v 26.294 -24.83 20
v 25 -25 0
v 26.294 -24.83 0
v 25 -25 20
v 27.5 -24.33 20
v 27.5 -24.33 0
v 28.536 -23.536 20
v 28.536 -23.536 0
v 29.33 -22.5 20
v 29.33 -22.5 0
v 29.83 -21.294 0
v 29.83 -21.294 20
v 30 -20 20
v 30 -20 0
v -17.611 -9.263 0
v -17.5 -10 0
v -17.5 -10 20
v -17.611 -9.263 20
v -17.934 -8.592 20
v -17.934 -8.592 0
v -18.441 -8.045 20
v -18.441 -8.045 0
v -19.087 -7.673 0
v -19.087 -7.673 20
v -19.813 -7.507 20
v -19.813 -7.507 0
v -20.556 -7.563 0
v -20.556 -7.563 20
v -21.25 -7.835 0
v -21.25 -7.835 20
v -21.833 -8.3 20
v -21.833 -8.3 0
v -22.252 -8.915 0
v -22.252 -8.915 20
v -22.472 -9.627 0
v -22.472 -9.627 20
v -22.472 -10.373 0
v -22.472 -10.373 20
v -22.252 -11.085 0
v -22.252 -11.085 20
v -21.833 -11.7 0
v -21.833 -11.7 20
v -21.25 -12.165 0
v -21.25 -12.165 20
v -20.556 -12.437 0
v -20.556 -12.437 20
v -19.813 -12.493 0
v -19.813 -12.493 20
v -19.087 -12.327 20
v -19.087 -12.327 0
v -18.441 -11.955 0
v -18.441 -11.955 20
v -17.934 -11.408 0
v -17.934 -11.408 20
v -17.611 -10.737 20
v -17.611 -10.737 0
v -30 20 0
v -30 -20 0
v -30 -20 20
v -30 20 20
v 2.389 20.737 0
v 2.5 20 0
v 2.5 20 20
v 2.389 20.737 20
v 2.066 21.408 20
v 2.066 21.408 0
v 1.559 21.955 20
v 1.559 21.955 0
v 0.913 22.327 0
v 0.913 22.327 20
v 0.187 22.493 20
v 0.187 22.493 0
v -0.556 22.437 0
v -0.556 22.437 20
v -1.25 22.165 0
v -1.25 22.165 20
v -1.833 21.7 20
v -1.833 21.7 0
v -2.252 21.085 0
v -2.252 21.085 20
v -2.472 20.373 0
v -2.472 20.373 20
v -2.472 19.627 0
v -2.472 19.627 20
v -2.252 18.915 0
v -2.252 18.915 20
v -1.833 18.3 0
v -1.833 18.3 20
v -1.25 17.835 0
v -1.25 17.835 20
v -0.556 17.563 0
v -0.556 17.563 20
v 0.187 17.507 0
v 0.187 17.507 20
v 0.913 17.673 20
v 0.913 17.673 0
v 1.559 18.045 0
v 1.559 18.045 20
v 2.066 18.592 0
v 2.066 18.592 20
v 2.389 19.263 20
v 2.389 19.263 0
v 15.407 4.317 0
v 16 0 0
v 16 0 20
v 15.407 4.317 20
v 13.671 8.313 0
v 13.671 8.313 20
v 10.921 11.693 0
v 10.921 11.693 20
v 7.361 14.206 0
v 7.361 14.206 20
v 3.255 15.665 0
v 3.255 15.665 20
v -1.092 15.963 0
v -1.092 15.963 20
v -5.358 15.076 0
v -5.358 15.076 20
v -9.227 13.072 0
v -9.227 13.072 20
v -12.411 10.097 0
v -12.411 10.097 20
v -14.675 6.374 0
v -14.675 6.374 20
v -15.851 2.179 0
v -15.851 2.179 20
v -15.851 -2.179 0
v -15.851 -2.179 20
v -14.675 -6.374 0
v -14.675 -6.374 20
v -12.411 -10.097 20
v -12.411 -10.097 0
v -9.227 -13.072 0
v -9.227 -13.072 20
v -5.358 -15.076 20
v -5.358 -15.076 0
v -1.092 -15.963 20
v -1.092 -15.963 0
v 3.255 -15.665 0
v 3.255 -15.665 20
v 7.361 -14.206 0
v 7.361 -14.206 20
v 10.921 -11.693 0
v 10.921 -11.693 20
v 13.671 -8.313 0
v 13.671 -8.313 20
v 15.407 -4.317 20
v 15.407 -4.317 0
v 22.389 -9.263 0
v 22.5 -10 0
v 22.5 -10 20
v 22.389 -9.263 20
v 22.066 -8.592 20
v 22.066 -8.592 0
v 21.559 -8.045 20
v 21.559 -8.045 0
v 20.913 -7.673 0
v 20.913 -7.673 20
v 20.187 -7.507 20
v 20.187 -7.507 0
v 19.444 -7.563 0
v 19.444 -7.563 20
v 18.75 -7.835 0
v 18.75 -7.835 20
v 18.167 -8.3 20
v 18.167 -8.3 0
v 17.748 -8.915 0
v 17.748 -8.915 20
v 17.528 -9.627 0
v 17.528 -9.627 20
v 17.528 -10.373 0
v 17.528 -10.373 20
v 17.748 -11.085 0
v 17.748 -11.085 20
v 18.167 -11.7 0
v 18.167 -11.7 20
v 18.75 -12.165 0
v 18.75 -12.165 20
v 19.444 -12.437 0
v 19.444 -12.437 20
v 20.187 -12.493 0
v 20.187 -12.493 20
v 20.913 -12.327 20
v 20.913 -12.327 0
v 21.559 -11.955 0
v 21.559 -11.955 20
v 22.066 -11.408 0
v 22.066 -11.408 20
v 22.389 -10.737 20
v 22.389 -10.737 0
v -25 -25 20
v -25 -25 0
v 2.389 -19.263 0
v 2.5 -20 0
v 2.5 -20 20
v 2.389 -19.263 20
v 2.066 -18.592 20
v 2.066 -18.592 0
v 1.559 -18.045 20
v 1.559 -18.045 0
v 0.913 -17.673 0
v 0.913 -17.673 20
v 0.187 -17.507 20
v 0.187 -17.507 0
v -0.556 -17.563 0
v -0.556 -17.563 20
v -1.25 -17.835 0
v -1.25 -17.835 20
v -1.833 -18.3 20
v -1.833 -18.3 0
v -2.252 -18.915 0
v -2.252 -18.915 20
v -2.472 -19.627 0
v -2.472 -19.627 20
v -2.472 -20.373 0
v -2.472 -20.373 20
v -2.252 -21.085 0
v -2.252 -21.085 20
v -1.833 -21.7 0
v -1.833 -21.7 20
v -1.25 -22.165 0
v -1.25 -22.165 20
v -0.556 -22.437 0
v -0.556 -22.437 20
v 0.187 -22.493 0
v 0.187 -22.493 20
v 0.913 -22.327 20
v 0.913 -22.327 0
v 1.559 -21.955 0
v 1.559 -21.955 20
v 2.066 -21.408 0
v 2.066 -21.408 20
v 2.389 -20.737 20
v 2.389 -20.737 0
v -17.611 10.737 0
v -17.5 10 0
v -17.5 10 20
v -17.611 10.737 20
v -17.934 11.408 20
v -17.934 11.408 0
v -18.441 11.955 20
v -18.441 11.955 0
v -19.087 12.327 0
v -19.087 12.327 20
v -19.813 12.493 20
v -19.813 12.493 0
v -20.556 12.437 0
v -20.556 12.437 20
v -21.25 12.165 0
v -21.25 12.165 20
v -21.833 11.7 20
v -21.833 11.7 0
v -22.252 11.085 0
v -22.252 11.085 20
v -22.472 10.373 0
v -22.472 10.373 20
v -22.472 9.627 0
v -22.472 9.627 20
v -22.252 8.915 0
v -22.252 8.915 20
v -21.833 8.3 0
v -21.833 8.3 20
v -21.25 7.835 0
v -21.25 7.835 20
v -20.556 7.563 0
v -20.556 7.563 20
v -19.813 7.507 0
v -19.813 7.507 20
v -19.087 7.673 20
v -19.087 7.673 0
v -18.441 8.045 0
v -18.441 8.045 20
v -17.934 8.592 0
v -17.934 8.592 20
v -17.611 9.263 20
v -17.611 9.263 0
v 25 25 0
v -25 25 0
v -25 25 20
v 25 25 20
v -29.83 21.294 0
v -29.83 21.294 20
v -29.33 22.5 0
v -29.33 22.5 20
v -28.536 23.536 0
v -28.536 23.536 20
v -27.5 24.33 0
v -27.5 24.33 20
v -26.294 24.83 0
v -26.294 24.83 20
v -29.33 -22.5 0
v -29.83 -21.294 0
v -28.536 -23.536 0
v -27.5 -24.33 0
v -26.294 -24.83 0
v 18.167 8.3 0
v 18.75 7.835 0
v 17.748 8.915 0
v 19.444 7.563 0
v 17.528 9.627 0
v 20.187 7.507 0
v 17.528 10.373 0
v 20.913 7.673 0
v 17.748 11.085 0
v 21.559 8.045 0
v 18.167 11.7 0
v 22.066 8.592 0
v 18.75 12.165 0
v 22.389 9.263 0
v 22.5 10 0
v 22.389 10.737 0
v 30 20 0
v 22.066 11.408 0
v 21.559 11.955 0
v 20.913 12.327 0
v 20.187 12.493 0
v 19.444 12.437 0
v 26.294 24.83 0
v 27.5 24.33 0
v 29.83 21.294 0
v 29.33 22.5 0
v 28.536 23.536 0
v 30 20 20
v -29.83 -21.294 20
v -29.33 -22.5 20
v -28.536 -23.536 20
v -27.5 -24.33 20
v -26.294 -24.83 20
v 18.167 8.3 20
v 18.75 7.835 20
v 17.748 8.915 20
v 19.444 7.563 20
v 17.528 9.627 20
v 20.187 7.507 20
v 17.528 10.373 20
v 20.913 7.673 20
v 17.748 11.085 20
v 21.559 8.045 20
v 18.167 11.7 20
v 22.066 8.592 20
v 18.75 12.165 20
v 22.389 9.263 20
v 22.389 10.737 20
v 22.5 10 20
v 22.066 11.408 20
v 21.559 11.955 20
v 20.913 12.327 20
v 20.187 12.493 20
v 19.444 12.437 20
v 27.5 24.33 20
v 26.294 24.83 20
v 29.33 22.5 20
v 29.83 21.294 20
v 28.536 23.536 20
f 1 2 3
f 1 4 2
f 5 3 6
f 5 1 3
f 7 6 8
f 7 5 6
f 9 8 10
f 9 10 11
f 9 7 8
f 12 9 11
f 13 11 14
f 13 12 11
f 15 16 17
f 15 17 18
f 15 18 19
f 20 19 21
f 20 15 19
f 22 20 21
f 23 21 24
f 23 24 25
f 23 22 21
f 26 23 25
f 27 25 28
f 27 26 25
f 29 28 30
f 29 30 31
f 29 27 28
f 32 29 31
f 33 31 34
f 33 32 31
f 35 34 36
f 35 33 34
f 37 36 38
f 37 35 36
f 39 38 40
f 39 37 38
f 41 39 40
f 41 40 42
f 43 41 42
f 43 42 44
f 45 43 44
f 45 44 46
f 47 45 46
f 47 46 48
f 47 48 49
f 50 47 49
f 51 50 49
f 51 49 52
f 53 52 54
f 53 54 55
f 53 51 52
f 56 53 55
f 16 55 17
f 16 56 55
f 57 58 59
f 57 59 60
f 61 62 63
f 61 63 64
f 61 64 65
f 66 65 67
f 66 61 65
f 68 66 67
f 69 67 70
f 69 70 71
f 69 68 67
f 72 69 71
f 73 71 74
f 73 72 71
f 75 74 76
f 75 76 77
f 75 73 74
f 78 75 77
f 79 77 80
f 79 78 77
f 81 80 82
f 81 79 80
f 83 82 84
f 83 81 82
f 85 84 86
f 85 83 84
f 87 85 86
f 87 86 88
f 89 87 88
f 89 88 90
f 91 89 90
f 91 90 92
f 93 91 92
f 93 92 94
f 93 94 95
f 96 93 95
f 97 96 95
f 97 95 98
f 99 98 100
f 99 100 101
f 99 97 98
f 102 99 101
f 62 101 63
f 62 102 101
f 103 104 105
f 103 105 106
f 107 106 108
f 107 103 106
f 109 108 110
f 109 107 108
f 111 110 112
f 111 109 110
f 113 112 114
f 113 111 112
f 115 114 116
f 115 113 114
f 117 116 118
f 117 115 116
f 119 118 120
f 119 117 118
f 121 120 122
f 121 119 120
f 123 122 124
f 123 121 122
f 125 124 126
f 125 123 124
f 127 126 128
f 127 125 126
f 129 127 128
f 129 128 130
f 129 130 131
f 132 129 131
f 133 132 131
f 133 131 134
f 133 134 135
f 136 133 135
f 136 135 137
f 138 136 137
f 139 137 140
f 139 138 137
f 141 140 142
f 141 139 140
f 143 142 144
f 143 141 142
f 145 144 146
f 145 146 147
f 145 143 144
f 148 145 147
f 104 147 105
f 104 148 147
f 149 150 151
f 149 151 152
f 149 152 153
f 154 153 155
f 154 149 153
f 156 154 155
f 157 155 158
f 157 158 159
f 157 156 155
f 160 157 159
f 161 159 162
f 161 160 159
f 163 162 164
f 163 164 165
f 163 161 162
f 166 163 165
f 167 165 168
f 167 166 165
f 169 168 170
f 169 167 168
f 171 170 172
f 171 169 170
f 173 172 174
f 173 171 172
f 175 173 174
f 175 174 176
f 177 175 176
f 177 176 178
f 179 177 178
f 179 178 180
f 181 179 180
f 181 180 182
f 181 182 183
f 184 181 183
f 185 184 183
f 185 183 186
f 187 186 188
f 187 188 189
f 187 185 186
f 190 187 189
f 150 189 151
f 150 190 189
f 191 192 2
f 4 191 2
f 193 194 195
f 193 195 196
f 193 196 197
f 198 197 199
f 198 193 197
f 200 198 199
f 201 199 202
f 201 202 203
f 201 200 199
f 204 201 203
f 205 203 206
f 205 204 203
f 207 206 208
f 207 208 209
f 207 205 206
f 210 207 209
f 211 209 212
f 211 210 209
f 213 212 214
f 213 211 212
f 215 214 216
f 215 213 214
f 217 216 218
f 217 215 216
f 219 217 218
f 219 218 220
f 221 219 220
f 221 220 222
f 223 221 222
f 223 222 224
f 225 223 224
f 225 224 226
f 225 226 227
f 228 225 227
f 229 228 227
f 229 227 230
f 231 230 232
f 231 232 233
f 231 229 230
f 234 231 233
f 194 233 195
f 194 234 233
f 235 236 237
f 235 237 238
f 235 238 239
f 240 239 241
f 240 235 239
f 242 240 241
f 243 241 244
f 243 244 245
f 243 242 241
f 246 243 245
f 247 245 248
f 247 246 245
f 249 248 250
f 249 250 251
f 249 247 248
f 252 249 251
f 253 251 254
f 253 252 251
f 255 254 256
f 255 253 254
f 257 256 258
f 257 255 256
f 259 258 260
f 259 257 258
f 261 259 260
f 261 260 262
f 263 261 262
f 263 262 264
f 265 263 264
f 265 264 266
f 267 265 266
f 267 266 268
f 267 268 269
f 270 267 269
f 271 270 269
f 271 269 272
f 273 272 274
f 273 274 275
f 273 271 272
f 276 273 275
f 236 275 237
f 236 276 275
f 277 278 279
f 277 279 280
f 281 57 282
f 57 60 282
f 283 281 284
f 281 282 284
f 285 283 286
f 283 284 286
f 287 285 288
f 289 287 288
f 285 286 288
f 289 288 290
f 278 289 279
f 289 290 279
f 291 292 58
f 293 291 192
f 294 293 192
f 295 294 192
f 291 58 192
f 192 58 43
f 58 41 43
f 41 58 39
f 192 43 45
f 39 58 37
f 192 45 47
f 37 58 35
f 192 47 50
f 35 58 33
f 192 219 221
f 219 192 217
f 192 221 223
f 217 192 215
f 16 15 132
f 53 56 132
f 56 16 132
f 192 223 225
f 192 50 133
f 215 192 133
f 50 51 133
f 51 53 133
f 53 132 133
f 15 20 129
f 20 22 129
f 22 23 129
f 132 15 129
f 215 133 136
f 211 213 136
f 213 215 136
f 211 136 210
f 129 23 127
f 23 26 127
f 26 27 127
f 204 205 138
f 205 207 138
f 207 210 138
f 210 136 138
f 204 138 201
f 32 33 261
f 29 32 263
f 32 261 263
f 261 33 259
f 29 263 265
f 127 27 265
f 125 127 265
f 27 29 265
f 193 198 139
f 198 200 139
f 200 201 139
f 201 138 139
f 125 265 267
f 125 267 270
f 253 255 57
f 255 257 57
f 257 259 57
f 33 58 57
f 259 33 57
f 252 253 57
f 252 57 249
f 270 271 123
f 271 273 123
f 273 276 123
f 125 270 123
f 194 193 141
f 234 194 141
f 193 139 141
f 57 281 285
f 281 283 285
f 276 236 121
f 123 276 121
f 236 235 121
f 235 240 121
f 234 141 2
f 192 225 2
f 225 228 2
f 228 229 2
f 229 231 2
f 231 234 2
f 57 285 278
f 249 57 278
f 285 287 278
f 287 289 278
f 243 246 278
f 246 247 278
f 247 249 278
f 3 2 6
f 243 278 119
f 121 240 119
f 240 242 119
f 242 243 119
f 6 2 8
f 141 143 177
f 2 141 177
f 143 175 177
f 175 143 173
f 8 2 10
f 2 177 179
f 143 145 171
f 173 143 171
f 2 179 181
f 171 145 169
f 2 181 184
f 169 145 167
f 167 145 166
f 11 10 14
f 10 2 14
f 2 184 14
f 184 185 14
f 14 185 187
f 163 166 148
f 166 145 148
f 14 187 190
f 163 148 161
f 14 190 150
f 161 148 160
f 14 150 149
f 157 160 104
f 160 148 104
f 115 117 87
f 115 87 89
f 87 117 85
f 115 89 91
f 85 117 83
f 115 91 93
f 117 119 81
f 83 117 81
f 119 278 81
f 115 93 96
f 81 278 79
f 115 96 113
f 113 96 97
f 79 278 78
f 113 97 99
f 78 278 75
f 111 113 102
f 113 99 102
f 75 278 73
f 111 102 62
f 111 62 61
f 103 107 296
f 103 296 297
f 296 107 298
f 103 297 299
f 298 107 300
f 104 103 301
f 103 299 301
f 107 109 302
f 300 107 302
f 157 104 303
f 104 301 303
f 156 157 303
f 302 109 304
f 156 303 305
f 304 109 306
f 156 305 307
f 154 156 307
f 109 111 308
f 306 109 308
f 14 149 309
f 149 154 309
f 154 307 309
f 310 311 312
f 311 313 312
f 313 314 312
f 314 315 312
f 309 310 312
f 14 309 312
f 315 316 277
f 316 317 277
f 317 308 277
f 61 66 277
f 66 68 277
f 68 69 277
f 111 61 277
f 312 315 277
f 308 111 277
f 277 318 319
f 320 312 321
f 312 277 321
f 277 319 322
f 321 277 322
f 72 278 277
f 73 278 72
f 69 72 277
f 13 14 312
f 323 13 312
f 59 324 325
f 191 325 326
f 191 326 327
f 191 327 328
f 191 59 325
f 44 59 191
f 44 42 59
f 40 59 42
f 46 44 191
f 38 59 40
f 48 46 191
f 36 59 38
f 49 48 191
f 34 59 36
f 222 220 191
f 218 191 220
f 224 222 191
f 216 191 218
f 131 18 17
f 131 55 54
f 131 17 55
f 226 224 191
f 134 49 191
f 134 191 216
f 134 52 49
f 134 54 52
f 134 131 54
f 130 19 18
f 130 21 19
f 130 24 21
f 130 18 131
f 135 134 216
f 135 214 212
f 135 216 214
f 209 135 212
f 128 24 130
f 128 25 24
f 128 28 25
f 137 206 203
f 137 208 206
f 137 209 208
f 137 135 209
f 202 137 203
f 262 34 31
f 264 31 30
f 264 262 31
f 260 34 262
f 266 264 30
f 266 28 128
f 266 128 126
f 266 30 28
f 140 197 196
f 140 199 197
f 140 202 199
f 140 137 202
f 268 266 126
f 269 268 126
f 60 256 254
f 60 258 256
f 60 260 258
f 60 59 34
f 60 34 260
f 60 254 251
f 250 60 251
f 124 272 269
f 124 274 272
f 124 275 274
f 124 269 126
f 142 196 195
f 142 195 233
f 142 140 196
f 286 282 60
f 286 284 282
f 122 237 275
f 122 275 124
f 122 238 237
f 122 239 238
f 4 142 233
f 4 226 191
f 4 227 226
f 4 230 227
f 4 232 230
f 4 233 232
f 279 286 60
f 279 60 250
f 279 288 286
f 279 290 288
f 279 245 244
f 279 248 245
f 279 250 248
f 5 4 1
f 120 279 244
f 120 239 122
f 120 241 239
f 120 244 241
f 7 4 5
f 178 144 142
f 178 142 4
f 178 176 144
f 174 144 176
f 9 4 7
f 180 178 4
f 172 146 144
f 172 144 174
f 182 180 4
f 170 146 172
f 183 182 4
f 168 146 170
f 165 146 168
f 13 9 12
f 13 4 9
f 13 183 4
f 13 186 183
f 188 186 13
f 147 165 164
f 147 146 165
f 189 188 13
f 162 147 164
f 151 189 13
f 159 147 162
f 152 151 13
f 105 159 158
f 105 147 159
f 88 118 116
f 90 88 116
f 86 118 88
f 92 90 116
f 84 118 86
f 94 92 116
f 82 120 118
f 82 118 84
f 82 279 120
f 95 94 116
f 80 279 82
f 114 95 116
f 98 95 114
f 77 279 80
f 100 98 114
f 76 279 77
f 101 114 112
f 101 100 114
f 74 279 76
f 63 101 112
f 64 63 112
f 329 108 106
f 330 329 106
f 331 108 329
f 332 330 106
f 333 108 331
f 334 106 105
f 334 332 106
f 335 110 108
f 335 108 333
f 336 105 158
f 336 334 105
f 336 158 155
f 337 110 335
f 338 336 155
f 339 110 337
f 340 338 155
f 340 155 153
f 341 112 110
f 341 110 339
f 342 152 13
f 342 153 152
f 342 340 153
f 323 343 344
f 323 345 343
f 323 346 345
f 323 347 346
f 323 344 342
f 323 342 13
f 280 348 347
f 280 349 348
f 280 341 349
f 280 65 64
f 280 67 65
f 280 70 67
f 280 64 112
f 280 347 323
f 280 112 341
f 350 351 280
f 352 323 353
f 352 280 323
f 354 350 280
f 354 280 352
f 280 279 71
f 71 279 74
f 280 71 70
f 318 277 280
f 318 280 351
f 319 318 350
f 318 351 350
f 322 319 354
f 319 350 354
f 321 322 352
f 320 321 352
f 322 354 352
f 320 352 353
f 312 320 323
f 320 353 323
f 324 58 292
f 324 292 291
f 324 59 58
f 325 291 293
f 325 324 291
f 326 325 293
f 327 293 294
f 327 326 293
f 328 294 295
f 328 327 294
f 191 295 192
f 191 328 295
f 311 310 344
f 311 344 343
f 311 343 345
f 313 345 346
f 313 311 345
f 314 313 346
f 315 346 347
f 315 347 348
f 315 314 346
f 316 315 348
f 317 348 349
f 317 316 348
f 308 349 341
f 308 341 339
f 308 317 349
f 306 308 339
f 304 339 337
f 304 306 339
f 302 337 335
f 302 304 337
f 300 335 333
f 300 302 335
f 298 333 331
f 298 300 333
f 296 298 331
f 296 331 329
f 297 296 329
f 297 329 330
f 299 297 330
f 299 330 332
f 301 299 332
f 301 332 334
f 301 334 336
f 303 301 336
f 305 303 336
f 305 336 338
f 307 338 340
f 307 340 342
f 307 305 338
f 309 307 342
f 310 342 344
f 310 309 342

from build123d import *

# Parameters (mm, degrees)
SKETCH_W   = 60
SKETCH_H   = 50
SKETCH_R   = 2.5
SKETCH_R_2 = 16
PAD_DEPTH  = 20
FILLET_R   = 5


with BuildPart() as part:
    # Sketch → Pad (new body)
    with BuildSketch(Plane.XY):
        Rectangle(SKETCH_W, SKETCH_H)
        with Locations((0, 20)):
            Circle(SKETCH_R, mode=Mode.SUBTRACT)
        with Locations((-20, 10)):
            Circle(SKETCH_R, mode=Mode.SUBTRACT)
        with Locations((-20, -10)):
            Circle(SKETCH_R, mode=Mode.SUBTRACT)
        with Locations((20, -10)):
            Circle(SKETCH_R, mode=Mode.SUBTRACT)
        with Locations((20, 10)):
            Circle(SKETCH_R, mode=Mode.SUBTRACT)
        with Locations((0, -20)):
            Circle(SKETCH_R, mode=Mode.SUBTRACT)
        Circle(SKETCH_R_2, mode=Mode.SUBTRACT)
    extrude(amount=PAD_DEPTH)

    # Fillet
    fillet_edges = [part.edges().sort_by_distance(p)[0] for p in [
        (30, 25, 10),
        (30, -25, 10),
        (-30, -25, 10),
        (-30, 25, 10),
    ]]
    fillet(fillet_edges, radius=FILLET_R)


solid = part.part
